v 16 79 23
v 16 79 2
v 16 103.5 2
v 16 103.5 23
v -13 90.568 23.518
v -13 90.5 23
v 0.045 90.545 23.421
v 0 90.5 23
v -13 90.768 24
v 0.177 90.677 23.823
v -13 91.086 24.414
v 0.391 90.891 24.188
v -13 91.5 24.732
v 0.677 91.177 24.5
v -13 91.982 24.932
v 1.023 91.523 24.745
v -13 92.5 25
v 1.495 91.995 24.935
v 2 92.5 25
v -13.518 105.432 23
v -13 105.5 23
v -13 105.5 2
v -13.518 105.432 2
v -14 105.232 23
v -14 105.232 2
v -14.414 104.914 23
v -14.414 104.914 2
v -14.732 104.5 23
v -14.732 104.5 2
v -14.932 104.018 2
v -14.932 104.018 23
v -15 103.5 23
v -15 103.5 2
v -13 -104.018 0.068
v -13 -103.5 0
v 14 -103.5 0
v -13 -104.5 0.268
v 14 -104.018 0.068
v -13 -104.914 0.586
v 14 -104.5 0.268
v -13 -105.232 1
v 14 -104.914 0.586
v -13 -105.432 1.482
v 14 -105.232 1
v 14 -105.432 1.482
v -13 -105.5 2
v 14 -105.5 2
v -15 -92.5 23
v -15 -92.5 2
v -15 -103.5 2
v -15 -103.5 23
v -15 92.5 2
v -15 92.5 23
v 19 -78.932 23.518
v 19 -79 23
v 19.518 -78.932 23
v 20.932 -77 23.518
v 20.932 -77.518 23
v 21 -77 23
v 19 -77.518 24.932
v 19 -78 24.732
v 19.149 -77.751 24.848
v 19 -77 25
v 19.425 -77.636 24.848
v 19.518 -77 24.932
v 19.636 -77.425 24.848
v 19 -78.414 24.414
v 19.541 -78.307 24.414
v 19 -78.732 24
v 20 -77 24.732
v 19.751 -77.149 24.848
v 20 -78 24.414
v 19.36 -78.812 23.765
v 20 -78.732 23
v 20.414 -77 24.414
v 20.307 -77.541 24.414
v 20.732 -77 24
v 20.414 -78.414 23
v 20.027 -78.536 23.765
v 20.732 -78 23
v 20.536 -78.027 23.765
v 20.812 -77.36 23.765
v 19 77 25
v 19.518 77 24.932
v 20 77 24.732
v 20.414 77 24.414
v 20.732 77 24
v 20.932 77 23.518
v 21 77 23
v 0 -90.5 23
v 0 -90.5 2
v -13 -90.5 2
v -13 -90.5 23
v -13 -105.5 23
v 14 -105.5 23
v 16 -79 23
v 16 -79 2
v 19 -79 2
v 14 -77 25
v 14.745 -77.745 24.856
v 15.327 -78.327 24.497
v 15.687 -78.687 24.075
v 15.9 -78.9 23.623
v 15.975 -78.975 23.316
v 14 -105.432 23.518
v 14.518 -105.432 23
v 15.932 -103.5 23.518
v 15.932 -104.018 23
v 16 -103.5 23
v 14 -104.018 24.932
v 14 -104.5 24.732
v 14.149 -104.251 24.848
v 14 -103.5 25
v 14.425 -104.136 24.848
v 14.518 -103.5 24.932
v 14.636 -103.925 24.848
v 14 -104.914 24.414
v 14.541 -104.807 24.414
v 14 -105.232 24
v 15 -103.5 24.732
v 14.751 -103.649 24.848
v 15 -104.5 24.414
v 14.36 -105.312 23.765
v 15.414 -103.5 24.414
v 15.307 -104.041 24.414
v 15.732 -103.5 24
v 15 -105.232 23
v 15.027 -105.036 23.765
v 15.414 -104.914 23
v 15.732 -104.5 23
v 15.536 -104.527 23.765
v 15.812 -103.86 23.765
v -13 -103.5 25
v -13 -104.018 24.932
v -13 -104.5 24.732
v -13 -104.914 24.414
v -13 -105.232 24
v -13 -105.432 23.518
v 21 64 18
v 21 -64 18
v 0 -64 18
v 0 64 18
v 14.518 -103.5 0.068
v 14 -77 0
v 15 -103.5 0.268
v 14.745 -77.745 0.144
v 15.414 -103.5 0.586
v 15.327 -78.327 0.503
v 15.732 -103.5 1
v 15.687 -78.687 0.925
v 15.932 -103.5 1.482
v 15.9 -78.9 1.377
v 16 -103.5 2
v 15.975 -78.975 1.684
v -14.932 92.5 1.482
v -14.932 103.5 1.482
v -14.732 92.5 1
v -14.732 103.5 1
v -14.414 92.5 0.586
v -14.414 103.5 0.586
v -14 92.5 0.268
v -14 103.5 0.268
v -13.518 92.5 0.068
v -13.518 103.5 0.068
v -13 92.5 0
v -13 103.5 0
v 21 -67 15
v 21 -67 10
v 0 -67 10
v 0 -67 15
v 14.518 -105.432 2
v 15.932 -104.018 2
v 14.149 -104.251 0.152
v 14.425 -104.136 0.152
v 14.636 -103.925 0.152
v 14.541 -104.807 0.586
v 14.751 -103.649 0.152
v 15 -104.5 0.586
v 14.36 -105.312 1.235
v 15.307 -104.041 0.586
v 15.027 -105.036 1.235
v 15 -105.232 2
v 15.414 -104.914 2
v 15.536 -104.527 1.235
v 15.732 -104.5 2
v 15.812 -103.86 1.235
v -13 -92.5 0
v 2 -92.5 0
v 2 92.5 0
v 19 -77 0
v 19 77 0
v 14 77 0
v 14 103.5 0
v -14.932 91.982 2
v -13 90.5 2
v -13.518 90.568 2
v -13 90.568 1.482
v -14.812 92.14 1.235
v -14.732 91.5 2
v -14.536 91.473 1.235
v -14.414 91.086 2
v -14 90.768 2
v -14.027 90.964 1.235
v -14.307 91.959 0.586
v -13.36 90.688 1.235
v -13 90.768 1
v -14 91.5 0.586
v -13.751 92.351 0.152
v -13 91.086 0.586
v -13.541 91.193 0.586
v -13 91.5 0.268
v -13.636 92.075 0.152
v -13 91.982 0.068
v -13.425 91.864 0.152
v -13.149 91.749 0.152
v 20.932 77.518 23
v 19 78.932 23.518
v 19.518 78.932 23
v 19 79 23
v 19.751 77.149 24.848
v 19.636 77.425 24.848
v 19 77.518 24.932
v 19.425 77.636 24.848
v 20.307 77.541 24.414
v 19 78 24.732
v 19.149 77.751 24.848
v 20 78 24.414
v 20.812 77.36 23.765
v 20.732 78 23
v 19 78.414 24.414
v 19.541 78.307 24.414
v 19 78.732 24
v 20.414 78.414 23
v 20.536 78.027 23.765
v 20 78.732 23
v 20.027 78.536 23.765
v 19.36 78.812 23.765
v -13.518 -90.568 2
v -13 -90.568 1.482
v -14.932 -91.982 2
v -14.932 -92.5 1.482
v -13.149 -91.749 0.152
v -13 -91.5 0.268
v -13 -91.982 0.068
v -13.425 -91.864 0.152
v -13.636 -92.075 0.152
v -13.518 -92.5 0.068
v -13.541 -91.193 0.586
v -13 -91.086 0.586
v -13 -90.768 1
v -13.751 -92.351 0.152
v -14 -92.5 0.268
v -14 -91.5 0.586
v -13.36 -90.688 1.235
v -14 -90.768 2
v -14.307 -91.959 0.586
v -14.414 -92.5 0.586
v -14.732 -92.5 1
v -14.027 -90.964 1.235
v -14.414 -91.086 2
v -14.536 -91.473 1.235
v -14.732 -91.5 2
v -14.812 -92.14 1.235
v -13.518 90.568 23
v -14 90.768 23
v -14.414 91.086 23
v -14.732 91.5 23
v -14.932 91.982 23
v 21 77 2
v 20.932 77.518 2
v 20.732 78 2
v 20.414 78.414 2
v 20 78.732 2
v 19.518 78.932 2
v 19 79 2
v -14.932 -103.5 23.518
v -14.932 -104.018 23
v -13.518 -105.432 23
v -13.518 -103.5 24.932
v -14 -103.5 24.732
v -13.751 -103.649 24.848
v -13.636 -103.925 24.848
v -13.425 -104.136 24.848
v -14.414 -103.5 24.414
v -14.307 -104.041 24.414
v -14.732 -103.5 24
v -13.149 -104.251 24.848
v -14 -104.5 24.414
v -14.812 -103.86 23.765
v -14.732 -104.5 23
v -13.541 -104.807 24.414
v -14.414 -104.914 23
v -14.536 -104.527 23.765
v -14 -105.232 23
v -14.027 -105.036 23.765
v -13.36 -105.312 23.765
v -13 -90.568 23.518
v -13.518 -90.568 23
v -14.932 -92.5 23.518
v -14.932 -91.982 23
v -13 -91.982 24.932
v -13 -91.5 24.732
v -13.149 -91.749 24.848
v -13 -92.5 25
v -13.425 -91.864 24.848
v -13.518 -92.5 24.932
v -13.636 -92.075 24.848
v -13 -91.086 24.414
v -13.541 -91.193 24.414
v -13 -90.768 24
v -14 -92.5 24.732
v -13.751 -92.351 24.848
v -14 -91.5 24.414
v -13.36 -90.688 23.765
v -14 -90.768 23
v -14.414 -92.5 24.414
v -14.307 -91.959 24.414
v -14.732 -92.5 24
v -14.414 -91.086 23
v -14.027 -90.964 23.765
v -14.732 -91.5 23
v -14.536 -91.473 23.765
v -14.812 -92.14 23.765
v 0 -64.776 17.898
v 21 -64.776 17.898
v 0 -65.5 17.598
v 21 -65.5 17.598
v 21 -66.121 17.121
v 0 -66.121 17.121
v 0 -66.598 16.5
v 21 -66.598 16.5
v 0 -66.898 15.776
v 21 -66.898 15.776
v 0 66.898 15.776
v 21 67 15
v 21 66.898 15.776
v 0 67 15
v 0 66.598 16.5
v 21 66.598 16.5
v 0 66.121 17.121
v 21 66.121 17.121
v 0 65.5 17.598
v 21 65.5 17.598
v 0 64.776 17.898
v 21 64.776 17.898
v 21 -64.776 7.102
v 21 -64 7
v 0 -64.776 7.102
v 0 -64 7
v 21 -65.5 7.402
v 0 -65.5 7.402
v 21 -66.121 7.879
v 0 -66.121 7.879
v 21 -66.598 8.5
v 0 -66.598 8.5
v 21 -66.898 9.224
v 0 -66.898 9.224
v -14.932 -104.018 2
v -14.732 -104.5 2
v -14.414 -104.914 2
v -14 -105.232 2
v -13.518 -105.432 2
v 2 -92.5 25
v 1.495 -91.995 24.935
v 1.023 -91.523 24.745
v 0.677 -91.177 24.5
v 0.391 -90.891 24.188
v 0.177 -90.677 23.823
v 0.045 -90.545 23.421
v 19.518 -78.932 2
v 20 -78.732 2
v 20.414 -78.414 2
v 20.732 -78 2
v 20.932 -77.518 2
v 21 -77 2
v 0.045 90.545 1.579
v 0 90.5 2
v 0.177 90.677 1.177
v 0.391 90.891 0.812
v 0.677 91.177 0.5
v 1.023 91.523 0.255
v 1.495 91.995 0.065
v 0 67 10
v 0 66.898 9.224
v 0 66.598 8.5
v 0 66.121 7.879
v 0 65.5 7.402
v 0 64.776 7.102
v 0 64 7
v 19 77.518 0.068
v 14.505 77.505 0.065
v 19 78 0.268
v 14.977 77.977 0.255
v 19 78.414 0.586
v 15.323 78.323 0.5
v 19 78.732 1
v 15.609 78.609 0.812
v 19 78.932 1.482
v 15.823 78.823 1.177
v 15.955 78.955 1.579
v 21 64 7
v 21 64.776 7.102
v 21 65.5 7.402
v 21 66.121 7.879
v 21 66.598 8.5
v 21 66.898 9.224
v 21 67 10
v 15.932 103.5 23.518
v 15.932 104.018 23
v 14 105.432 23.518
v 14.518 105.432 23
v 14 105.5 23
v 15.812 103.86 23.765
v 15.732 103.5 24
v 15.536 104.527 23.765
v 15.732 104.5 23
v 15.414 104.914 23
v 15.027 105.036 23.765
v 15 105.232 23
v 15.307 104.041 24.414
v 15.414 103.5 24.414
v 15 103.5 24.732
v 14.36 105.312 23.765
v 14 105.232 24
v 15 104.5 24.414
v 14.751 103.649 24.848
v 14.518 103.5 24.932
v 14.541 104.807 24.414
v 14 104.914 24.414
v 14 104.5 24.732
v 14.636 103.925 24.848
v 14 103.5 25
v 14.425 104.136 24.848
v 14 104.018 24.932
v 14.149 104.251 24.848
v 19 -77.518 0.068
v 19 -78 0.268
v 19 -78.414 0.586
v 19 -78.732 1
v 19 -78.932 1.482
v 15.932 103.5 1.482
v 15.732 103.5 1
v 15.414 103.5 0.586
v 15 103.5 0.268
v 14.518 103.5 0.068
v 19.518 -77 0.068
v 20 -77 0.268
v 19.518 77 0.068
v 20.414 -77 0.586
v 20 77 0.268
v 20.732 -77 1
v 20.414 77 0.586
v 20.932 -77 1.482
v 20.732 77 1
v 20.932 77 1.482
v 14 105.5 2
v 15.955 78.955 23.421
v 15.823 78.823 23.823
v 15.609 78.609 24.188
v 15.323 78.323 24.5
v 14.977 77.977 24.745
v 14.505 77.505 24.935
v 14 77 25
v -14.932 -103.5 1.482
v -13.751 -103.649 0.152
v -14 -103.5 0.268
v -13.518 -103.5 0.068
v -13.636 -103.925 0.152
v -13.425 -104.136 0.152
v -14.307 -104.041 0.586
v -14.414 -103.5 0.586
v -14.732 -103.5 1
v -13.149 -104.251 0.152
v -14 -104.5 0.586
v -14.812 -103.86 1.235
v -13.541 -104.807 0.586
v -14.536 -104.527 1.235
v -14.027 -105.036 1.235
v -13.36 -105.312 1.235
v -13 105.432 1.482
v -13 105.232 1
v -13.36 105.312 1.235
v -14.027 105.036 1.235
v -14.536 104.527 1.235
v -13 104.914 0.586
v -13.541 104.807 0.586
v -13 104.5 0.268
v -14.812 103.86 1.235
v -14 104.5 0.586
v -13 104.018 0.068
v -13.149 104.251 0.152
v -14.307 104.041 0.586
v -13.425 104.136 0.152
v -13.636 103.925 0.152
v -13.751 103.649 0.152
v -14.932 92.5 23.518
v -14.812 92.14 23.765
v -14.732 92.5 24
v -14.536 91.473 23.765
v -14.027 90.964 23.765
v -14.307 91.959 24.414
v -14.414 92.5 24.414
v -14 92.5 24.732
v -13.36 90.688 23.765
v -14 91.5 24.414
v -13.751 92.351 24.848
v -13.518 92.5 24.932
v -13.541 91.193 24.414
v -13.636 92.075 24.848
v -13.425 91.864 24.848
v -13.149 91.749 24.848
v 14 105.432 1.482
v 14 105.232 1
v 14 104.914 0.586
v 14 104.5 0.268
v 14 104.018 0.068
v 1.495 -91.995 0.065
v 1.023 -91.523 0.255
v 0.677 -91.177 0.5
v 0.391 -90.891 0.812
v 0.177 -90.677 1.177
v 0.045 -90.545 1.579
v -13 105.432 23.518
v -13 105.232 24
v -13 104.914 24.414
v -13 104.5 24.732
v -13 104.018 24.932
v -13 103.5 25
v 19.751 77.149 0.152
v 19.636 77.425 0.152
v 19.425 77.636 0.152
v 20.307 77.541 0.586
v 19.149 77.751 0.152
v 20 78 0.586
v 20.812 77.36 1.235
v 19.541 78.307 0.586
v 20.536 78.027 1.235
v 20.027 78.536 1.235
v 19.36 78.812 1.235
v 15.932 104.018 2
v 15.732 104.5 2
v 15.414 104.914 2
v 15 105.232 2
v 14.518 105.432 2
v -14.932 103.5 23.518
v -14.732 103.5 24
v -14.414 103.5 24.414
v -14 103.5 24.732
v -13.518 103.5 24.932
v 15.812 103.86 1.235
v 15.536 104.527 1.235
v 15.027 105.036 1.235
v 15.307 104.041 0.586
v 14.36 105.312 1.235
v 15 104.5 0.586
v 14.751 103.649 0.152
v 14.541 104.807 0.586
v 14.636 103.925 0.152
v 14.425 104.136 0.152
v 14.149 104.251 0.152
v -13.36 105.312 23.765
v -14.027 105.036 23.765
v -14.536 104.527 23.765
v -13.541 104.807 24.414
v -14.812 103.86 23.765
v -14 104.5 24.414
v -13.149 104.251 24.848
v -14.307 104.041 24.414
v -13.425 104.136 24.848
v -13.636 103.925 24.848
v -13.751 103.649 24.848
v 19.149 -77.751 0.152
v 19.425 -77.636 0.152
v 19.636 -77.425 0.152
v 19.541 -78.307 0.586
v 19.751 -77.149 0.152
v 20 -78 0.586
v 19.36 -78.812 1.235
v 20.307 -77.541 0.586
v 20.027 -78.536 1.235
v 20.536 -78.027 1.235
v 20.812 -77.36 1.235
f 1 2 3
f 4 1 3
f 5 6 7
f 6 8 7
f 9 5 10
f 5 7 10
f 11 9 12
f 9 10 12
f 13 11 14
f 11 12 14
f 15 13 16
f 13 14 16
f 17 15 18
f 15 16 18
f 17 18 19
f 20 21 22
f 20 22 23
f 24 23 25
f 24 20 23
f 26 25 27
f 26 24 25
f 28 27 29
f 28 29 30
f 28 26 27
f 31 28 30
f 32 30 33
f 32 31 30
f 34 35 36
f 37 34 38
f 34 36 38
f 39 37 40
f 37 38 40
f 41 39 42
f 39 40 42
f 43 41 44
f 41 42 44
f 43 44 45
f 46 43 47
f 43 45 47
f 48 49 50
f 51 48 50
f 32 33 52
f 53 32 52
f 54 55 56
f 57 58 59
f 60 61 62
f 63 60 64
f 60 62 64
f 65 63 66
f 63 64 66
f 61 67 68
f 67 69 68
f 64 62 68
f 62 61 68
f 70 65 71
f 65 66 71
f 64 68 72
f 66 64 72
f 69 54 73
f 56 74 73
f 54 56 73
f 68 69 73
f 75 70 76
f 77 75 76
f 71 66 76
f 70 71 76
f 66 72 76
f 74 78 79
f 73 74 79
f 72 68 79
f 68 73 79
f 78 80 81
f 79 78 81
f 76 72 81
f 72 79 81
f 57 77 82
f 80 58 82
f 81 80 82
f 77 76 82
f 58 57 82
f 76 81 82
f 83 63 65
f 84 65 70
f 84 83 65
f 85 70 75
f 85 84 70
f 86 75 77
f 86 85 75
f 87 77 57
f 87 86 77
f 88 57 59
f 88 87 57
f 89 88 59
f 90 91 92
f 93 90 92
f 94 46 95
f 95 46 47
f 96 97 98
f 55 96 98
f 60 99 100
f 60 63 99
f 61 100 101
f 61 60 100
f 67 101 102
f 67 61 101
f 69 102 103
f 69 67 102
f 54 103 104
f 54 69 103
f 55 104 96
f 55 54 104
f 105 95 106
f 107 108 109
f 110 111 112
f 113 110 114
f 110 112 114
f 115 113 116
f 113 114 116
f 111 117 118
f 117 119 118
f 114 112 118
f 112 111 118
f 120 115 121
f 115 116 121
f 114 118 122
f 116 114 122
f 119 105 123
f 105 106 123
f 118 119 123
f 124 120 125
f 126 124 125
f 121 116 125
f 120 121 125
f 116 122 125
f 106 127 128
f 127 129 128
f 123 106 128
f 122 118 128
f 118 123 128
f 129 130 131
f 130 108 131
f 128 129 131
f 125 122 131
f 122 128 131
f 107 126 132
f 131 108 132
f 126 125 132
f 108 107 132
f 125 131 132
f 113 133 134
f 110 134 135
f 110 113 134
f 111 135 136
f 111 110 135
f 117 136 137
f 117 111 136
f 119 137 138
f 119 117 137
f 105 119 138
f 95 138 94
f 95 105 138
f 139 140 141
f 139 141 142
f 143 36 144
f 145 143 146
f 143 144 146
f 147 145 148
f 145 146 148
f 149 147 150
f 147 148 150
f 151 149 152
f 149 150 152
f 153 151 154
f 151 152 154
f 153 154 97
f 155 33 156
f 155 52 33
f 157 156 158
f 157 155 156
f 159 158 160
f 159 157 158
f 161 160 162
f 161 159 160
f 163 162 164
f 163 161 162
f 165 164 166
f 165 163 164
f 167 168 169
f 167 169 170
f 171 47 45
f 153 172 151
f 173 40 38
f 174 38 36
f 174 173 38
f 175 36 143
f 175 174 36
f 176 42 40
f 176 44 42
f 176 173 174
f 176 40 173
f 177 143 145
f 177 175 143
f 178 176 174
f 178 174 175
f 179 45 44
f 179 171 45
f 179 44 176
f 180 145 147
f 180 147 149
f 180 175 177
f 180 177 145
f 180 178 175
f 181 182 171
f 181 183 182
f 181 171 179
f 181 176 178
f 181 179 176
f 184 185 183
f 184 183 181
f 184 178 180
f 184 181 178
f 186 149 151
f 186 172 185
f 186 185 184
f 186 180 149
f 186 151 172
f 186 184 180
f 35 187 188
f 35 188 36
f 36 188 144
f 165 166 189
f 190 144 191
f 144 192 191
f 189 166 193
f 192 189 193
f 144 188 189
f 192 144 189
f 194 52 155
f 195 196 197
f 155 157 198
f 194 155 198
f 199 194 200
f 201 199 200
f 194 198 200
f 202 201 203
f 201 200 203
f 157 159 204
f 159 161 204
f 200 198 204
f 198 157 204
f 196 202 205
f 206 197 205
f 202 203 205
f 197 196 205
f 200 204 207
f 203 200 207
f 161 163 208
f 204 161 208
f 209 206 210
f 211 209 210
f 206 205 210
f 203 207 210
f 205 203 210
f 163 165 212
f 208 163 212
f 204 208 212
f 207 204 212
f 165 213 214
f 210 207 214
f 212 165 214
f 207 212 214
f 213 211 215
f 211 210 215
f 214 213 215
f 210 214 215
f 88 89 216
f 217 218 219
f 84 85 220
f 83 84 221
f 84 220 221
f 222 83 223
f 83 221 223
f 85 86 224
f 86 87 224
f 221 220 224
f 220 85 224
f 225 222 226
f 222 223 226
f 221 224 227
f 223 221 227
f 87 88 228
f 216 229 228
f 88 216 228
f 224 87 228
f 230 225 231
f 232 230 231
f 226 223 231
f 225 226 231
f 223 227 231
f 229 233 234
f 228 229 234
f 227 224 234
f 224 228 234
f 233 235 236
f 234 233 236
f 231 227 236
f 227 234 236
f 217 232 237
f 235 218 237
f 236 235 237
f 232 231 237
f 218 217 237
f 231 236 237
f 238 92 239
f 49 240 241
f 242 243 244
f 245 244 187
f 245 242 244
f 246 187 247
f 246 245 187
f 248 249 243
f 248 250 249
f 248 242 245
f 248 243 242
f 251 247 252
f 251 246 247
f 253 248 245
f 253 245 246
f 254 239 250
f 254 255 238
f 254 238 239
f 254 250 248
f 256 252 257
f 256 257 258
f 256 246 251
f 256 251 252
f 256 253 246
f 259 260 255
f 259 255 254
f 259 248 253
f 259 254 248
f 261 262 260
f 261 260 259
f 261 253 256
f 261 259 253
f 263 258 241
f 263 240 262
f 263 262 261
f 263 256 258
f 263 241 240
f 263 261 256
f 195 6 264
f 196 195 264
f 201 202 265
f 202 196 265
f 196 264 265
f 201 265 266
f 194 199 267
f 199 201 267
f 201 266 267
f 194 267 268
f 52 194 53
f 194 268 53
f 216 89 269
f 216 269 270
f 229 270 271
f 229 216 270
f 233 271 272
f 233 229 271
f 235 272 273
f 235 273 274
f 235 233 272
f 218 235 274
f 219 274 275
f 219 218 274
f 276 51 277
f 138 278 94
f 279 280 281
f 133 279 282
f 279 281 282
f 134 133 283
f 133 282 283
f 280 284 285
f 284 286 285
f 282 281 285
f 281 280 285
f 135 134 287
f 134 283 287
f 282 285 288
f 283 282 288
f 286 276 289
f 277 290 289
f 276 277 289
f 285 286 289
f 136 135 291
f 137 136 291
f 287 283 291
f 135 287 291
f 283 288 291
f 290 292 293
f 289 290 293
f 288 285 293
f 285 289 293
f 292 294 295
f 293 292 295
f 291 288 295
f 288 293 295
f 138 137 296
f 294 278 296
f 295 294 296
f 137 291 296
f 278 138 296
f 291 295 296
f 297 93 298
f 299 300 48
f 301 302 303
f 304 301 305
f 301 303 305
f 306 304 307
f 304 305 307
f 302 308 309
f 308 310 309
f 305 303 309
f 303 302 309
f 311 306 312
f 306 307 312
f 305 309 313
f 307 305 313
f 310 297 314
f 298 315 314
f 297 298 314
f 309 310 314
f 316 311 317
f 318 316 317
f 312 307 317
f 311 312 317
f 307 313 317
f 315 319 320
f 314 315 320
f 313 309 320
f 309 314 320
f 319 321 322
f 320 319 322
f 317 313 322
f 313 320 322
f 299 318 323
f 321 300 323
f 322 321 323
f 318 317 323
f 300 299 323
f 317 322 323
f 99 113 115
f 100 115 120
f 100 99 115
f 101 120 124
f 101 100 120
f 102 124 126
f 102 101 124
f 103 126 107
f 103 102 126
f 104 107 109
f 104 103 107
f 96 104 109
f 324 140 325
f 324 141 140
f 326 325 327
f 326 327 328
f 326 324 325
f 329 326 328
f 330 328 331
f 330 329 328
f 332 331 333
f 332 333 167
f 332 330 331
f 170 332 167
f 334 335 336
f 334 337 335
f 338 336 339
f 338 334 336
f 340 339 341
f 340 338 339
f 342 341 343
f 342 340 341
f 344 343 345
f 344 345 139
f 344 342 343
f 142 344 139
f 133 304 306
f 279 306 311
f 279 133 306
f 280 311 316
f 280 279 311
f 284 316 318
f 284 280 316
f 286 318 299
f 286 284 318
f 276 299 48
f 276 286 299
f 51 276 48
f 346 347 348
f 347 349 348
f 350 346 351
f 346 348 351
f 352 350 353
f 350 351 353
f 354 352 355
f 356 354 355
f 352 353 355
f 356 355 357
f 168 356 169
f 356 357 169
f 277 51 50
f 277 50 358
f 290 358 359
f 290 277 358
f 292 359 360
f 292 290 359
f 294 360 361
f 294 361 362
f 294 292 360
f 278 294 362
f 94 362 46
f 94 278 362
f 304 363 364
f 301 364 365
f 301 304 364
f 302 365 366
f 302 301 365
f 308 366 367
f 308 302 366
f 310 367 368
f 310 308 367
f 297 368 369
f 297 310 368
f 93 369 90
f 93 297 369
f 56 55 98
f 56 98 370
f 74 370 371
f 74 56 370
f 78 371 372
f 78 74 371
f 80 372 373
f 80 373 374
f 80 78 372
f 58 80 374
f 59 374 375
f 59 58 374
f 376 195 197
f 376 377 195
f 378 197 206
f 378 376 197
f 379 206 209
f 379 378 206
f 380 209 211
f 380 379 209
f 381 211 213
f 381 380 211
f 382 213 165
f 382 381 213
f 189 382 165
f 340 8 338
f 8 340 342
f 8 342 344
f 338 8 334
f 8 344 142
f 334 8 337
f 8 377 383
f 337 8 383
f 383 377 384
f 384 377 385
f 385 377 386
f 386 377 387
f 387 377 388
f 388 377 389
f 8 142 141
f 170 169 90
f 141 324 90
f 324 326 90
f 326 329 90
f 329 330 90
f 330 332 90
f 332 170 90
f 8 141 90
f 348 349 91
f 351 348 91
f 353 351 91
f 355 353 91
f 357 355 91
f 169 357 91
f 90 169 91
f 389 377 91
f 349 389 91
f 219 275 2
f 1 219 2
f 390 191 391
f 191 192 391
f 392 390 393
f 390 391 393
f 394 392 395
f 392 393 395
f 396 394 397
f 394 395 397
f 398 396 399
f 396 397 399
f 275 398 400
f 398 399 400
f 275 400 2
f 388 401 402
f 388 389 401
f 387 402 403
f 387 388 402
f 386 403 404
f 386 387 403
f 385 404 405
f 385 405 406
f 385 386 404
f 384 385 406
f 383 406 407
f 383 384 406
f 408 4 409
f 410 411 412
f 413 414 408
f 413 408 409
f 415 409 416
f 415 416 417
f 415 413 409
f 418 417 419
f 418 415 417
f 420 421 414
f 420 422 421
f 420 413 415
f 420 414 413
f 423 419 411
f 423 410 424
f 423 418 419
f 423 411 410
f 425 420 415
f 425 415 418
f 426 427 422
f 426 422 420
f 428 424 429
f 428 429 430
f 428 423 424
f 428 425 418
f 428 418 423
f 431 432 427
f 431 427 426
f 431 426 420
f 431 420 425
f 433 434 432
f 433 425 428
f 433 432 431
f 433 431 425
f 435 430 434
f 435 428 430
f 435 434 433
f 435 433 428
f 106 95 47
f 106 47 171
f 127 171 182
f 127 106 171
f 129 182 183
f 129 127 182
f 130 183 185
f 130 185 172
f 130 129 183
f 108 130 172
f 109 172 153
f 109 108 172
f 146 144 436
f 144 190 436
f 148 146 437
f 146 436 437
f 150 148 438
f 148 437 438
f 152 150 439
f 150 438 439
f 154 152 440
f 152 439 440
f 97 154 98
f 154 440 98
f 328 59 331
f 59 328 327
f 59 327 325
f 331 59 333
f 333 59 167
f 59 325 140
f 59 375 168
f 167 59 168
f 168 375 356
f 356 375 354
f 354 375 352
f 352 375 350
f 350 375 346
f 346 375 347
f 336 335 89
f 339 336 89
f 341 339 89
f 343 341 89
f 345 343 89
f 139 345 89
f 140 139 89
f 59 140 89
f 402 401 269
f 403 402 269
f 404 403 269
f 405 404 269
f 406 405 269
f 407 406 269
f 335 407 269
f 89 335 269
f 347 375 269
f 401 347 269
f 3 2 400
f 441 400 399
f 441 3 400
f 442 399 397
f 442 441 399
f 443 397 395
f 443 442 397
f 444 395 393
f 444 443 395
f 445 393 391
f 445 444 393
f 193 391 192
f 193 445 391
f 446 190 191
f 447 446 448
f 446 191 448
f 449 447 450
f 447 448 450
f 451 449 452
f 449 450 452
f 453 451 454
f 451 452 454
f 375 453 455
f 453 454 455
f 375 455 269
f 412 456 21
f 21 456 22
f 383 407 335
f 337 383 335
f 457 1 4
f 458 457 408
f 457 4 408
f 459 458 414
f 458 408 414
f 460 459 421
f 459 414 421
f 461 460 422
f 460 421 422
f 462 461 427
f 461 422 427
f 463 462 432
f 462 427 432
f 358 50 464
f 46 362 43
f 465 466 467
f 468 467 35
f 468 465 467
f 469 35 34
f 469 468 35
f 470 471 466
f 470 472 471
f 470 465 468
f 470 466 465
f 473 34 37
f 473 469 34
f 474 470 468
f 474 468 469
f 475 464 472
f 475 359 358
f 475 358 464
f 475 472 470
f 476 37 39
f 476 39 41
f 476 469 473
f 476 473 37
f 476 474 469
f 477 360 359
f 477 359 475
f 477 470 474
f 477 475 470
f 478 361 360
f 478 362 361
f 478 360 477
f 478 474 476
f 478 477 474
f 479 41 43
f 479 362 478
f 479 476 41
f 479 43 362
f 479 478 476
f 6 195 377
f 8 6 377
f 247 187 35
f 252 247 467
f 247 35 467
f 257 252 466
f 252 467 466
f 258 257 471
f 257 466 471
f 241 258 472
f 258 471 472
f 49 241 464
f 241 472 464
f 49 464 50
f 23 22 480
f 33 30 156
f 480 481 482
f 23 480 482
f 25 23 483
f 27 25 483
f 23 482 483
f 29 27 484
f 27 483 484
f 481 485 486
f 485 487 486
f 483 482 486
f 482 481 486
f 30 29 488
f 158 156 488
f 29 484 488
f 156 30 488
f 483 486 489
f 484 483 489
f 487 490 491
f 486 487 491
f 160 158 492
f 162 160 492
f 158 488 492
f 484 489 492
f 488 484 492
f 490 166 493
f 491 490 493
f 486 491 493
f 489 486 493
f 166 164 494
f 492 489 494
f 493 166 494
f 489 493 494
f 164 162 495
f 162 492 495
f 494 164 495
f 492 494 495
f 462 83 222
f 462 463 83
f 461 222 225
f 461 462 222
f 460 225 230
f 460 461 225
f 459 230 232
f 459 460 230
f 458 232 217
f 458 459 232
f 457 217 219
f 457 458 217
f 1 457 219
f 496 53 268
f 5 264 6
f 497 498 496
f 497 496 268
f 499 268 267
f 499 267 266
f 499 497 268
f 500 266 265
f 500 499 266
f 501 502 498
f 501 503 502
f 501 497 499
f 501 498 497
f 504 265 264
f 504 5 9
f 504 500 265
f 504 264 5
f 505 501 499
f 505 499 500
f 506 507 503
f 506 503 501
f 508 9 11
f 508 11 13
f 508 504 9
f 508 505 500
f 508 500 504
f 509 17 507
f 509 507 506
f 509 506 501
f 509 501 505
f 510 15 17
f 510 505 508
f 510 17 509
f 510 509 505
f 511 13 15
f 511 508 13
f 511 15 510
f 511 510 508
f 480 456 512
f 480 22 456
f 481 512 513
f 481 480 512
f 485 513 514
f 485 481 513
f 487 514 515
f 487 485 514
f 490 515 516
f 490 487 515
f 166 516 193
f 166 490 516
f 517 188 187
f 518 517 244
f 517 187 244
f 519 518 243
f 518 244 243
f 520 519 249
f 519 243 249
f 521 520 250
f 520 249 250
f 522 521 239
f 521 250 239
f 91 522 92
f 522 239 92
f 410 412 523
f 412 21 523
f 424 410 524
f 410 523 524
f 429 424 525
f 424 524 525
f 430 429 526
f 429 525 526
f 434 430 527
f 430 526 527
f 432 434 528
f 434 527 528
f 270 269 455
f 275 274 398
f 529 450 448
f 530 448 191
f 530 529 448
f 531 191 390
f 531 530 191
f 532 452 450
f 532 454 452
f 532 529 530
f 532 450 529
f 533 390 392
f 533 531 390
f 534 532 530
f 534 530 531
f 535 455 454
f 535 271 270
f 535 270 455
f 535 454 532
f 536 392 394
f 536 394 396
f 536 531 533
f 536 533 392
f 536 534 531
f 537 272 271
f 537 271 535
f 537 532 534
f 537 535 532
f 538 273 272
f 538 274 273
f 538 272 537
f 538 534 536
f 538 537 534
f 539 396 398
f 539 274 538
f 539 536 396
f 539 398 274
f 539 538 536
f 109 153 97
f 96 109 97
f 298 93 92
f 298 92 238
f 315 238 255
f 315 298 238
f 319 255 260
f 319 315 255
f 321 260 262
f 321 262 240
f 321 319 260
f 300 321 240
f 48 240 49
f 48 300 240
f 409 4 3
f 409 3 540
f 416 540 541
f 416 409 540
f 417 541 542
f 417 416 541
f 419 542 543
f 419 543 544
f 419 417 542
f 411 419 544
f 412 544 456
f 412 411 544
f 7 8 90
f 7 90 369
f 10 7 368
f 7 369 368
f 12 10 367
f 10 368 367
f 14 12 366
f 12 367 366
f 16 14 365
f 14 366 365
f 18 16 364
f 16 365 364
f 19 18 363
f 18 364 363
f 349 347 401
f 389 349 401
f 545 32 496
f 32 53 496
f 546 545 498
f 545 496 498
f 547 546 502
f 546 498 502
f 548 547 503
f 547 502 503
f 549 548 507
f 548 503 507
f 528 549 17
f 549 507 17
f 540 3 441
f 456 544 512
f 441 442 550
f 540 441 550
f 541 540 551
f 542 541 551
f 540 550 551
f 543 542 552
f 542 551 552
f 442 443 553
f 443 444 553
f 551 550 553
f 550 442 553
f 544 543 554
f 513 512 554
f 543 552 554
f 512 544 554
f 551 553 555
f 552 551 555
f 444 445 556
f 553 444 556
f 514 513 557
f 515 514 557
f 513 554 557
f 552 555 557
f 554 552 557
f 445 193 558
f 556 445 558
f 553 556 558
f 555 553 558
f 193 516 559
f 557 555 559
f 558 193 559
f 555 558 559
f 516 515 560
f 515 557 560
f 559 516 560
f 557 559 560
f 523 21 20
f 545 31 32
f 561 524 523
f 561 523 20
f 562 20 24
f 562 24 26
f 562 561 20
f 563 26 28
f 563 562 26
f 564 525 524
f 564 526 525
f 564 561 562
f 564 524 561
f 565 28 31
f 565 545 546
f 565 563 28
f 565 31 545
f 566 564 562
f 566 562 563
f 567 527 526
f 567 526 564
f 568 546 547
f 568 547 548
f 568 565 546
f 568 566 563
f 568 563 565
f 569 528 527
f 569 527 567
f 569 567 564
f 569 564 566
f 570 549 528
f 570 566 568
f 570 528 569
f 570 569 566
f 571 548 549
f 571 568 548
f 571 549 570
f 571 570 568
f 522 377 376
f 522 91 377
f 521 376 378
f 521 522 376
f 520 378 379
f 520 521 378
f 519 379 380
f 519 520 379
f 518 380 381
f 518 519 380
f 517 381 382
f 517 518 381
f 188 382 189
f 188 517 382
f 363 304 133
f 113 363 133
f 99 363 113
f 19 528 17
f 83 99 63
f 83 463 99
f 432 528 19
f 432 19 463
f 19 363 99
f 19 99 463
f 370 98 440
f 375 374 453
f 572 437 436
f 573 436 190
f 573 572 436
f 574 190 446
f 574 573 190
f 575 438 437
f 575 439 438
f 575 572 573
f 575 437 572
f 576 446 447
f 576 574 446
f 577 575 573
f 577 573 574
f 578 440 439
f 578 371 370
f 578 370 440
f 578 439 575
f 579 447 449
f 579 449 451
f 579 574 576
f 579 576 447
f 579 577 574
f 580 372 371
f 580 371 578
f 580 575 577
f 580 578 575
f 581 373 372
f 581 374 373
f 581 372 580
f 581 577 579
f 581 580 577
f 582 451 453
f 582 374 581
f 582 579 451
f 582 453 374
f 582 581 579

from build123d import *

# Parameters (mm, degrees)
F1_DEPTH = 25
F2_R     = 2
F3_W     = 134
F3_H     = 11
F4_DEPTH = 25
F5_R     = 3
F6_R     = 2


with BuildPart() as f1:
    # F0 (on Top) → F1 (new body)
    with BuildSketch(Plane.XY):
        Polygon((-15, 90.5), (0, 90.5), (0, -90.5), (-15, -90.5), (-15, -105.5), (16, -105.5), (16, -79), (21, -79), (21, 79), (16, 79), (16, 105.5), (-15, 105.5), align=None)
    extrude(amount=F1_DEPTH)

    # F2
    f2_edges = [f1.edges().sort_by_distance(p)[0] for p in [
        (-15, -105.5, 12.5),
        (-15, 105.5, 12.5),
        (-15, 90.5, 12.5),
        (-15, -90.5, 12.5),
        (16, -105.5, 12.5),
        (21, -79, 12.5),
        (21, 79, 12.5),
        (16, 105.5, 12.5),
    ]]
    fillet(f2_edges, radius=F2_R)

    # F3 (on face) → F4 (cut)
    with BuildSketch(Plane.YZ.offset(21)):
        with Locations((0, 12.5)):
            Rectangle(F3_W, F3_H)
    extrude(amount=-F4_DEPTH, mode=Mode.SUBTRACT)

    # F5
    f5_edges = [f1.edges().sort_by_distance(p)[0] for p in [
        (10.5, -67, 7),
        (10.5, 67, 18),
        (10.5, 67, 7),
        (10.5, -67, 18),
    ]]
    fillet(f5_edges, radius=F5_R)

    # F6
    f6_edges = [f1.edges().sort_by_distance(p)[0] for p in [
        (-6.5, 90.5, 25),
        (-14.414214, 91.085786, 25),
        (0, 0, 25),
        (-15, 98, 25),
        (-6.5, -90.5, 25),
        (-14.414214, 104.914214, 25),
        (-14.414214, -91.085786, 25),
        (0.5, 105.5, 25),
        (-15, -98, 25),
        (15.414214, 104.914214, 25),
        (-14.414214, -104.914214, 25),
        (16, 91.25, 25),
        (0.5, -105.5, 25),
        (17.5, 79, 25),
        (15.414214, -104.914214, 25),
        (20.414214, 78.414214, 25),
        (16, -91.25, 25),
        (21, 0, 25),
        (17.5, -79, 25),
        (20.414214, -78.414214, 25),
        (-6.5, 90.5, 0),
        (-14.414214, 91.085786, 0),
        (0, 0, 0),
        (-15, 98, 0),
        (-6.5, -90.5, 0),
        (-14.414214, 104.914214, 0),
        (-14.414214, -91.085786, 0),
        (0.5, 105.5, 0),
        (-15, -98, 0),
        (15.414214, 104.914214, 0),
        (-14.414214, -104.914214, 0),
        (16, 91.25, 0),
        (0.5, -105.5, 0),
        (17.5, 79, 0),
        (15.414214, -104.914214, 0),
        (20.414214, 78.414214, 0),
        (16, -91.25, 0),
        (21, 0, 0),
        (17.5, -79, 0),
        (20.414214, -78.414214, 0),
    ]]
    fillet(f6_edges, radius=F6_R)


solid = f1.part
